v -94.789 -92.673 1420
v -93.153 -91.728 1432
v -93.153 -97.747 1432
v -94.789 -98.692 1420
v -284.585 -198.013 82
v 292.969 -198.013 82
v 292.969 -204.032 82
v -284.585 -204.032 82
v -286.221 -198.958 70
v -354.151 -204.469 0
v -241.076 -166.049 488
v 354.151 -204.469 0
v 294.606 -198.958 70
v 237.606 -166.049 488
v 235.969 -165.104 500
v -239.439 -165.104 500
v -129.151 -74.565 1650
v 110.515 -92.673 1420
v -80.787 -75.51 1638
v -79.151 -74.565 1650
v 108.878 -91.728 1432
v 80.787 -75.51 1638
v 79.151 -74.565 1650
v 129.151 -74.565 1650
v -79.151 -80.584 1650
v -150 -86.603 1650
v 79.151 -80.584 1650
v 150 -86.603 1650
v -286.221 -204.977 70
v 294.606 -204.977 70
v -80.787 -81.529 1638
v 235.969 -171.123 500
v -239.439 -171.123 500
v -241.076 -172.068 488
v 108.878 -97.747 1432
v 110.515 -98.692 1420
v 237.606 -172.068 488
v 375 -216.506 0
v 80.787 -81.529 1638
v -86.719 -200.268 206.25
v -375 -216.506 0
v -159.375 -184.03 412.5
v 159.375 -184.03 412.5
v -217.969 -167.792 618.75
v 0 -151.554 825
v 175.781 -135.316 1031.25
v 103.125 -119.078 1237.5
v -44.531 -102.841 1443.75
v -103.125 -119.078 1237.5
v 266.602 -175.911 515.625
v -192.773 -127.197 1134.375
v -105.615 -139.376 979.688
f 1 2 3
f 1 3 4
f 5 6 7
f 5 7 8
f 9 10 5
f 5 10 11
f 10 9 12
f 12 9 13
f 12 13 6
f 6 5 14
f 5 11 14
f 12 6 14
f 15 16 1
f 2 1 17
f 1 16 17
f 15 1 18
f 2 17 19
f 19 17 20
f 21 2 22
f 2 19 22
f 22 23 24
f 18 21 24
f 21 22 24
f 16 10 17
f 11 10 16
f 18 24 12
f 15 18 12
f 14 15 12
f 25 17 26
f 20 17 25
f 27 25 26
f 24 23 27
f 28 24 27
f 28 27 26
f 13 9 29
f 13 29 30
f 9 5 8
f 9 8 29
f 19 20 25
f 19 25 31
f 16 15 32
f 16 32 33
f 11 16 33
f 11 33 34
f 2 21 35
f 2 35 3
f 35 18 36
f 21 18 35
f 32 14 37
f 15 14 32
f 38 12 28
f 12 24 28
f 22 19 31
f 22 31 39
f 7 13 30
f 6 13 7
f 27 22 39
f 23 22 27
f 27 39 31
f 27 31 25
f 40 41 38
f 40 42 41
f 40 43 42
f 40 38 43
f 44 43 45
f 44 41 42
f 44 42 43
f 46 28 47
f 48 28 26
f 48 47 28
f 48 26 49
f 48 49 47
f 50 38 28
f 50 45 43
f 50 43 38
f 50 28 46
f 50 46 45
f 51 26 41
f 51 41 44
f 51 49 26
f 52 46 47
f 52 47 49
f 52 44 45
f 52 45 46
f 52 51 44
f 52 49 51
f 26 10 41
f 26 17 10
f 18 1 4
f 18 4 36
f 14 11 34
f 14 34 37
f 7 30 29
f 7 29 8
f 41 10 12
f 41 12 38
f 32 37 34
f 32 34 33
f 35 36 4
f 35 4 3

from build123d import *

# Parameters (mm, degrees)
F7_R      = 960.2431856589
F8_DEPTH  = 635.5163904251
F12_R     = 870.2287794889
F13_DEPTH = 25
F14_R     = 892.9375722879
F15_DEPTH = 25
F19_REACH = 785.9273977736


with BuildPart() as f5:
    # F3 (on Top) → F5 section 0
    with BuildSketch(Plane.XY):
        Polygon((-375, -216.5063509461), (375, -216.5063509461), (0, 433.0127018922), align=None)
    # F4 (on line) → F5 section 1
    with BuildSketch(Plane.XY.offset(1650)):
        Polygon((-150, -86.6025403784), (150, -86.6025403784), (0, 173.2050807569), align=None)
    loft()

    # F7 (on face) → F8 (cut, through all)
    with BuildSketch(Plane(origin=(0, -203.2096543416, 15.9986111776), x_dir=(1, 0, 0), z_dir=(0, -0.9969151597, 0.078486714))):
        with Locations((0, 812.9688501358)):
            Circle(F7_R)
    extrude(amount=-F8_DEPTH, mode=Mode.SUBTRACT)

    # F12 (on face) → F13 (cut)
    with BuildSketch(Plane(origin=(0, 0, 0), x_dir=(0.8660254038, -0.5, 0), z_dir=(-0.5, -0.8660254038, 0))):
        with Locations((304.0688931942, 817.2121047974)):
            Circle(F12_R)
    extrude(amount=-F13_DEPTH, mode=Mode.SUBTRACT)

    # F14 (on face) → F15 (cut)
    with BuildSketch(Plane(origin=(0, 0, 0), x_dir=(-0.8660254038, -0.5, 0), z_dir=(-0.5, 0.8660254038, 0))):
        with Locations((291.6465699673, 811.1194968224)):
            Circle(F14_R)
    extrude(amount=F15_DEPTH, mode=Mode.SUBTRACT)

    f19_end = Plane(origin=(0, -155.5781982198, 697.4454188962), x_dir=(0, 0.078486714, 0.9969151597), z_dir=(0, 0.9969151597, -0.078486714))
    # F17 (on Front) → F19 (cut, up to a plane its end follows)
    with BuildSketch(Plane.XZ):
        Polygon((80.7874383415, 1638), (79.1510747051, 1650), (-79.1510747051, 1650), (-80.7874383415, 1638), align=None)
        Polygon((-94.7891388542, 1420), (110.5147110688, 1420), (108.8783474324, 1432), (-93.1527752178, 1432), align=None)
        Polygon((237.6056201597, 488), (235.9692565233, 500), (-239.4393885352, 500), (-241.0757521715, 488), align=None)
        Polygon((-286.2211157241, 70), (294.6056201597, 70), (292.9692565233, 82), (-284.5847520878, 82), align=None)
    f19_long = extrude(amount=F19_REACH, mode=Mode.PRIVATE)
    add(split(f19_long, bisect_by=f19_end, keep=Keep.TOP, mode=Mode.PRIVATE), mode=Mode.SUBTRACT)


solid = f5.part
